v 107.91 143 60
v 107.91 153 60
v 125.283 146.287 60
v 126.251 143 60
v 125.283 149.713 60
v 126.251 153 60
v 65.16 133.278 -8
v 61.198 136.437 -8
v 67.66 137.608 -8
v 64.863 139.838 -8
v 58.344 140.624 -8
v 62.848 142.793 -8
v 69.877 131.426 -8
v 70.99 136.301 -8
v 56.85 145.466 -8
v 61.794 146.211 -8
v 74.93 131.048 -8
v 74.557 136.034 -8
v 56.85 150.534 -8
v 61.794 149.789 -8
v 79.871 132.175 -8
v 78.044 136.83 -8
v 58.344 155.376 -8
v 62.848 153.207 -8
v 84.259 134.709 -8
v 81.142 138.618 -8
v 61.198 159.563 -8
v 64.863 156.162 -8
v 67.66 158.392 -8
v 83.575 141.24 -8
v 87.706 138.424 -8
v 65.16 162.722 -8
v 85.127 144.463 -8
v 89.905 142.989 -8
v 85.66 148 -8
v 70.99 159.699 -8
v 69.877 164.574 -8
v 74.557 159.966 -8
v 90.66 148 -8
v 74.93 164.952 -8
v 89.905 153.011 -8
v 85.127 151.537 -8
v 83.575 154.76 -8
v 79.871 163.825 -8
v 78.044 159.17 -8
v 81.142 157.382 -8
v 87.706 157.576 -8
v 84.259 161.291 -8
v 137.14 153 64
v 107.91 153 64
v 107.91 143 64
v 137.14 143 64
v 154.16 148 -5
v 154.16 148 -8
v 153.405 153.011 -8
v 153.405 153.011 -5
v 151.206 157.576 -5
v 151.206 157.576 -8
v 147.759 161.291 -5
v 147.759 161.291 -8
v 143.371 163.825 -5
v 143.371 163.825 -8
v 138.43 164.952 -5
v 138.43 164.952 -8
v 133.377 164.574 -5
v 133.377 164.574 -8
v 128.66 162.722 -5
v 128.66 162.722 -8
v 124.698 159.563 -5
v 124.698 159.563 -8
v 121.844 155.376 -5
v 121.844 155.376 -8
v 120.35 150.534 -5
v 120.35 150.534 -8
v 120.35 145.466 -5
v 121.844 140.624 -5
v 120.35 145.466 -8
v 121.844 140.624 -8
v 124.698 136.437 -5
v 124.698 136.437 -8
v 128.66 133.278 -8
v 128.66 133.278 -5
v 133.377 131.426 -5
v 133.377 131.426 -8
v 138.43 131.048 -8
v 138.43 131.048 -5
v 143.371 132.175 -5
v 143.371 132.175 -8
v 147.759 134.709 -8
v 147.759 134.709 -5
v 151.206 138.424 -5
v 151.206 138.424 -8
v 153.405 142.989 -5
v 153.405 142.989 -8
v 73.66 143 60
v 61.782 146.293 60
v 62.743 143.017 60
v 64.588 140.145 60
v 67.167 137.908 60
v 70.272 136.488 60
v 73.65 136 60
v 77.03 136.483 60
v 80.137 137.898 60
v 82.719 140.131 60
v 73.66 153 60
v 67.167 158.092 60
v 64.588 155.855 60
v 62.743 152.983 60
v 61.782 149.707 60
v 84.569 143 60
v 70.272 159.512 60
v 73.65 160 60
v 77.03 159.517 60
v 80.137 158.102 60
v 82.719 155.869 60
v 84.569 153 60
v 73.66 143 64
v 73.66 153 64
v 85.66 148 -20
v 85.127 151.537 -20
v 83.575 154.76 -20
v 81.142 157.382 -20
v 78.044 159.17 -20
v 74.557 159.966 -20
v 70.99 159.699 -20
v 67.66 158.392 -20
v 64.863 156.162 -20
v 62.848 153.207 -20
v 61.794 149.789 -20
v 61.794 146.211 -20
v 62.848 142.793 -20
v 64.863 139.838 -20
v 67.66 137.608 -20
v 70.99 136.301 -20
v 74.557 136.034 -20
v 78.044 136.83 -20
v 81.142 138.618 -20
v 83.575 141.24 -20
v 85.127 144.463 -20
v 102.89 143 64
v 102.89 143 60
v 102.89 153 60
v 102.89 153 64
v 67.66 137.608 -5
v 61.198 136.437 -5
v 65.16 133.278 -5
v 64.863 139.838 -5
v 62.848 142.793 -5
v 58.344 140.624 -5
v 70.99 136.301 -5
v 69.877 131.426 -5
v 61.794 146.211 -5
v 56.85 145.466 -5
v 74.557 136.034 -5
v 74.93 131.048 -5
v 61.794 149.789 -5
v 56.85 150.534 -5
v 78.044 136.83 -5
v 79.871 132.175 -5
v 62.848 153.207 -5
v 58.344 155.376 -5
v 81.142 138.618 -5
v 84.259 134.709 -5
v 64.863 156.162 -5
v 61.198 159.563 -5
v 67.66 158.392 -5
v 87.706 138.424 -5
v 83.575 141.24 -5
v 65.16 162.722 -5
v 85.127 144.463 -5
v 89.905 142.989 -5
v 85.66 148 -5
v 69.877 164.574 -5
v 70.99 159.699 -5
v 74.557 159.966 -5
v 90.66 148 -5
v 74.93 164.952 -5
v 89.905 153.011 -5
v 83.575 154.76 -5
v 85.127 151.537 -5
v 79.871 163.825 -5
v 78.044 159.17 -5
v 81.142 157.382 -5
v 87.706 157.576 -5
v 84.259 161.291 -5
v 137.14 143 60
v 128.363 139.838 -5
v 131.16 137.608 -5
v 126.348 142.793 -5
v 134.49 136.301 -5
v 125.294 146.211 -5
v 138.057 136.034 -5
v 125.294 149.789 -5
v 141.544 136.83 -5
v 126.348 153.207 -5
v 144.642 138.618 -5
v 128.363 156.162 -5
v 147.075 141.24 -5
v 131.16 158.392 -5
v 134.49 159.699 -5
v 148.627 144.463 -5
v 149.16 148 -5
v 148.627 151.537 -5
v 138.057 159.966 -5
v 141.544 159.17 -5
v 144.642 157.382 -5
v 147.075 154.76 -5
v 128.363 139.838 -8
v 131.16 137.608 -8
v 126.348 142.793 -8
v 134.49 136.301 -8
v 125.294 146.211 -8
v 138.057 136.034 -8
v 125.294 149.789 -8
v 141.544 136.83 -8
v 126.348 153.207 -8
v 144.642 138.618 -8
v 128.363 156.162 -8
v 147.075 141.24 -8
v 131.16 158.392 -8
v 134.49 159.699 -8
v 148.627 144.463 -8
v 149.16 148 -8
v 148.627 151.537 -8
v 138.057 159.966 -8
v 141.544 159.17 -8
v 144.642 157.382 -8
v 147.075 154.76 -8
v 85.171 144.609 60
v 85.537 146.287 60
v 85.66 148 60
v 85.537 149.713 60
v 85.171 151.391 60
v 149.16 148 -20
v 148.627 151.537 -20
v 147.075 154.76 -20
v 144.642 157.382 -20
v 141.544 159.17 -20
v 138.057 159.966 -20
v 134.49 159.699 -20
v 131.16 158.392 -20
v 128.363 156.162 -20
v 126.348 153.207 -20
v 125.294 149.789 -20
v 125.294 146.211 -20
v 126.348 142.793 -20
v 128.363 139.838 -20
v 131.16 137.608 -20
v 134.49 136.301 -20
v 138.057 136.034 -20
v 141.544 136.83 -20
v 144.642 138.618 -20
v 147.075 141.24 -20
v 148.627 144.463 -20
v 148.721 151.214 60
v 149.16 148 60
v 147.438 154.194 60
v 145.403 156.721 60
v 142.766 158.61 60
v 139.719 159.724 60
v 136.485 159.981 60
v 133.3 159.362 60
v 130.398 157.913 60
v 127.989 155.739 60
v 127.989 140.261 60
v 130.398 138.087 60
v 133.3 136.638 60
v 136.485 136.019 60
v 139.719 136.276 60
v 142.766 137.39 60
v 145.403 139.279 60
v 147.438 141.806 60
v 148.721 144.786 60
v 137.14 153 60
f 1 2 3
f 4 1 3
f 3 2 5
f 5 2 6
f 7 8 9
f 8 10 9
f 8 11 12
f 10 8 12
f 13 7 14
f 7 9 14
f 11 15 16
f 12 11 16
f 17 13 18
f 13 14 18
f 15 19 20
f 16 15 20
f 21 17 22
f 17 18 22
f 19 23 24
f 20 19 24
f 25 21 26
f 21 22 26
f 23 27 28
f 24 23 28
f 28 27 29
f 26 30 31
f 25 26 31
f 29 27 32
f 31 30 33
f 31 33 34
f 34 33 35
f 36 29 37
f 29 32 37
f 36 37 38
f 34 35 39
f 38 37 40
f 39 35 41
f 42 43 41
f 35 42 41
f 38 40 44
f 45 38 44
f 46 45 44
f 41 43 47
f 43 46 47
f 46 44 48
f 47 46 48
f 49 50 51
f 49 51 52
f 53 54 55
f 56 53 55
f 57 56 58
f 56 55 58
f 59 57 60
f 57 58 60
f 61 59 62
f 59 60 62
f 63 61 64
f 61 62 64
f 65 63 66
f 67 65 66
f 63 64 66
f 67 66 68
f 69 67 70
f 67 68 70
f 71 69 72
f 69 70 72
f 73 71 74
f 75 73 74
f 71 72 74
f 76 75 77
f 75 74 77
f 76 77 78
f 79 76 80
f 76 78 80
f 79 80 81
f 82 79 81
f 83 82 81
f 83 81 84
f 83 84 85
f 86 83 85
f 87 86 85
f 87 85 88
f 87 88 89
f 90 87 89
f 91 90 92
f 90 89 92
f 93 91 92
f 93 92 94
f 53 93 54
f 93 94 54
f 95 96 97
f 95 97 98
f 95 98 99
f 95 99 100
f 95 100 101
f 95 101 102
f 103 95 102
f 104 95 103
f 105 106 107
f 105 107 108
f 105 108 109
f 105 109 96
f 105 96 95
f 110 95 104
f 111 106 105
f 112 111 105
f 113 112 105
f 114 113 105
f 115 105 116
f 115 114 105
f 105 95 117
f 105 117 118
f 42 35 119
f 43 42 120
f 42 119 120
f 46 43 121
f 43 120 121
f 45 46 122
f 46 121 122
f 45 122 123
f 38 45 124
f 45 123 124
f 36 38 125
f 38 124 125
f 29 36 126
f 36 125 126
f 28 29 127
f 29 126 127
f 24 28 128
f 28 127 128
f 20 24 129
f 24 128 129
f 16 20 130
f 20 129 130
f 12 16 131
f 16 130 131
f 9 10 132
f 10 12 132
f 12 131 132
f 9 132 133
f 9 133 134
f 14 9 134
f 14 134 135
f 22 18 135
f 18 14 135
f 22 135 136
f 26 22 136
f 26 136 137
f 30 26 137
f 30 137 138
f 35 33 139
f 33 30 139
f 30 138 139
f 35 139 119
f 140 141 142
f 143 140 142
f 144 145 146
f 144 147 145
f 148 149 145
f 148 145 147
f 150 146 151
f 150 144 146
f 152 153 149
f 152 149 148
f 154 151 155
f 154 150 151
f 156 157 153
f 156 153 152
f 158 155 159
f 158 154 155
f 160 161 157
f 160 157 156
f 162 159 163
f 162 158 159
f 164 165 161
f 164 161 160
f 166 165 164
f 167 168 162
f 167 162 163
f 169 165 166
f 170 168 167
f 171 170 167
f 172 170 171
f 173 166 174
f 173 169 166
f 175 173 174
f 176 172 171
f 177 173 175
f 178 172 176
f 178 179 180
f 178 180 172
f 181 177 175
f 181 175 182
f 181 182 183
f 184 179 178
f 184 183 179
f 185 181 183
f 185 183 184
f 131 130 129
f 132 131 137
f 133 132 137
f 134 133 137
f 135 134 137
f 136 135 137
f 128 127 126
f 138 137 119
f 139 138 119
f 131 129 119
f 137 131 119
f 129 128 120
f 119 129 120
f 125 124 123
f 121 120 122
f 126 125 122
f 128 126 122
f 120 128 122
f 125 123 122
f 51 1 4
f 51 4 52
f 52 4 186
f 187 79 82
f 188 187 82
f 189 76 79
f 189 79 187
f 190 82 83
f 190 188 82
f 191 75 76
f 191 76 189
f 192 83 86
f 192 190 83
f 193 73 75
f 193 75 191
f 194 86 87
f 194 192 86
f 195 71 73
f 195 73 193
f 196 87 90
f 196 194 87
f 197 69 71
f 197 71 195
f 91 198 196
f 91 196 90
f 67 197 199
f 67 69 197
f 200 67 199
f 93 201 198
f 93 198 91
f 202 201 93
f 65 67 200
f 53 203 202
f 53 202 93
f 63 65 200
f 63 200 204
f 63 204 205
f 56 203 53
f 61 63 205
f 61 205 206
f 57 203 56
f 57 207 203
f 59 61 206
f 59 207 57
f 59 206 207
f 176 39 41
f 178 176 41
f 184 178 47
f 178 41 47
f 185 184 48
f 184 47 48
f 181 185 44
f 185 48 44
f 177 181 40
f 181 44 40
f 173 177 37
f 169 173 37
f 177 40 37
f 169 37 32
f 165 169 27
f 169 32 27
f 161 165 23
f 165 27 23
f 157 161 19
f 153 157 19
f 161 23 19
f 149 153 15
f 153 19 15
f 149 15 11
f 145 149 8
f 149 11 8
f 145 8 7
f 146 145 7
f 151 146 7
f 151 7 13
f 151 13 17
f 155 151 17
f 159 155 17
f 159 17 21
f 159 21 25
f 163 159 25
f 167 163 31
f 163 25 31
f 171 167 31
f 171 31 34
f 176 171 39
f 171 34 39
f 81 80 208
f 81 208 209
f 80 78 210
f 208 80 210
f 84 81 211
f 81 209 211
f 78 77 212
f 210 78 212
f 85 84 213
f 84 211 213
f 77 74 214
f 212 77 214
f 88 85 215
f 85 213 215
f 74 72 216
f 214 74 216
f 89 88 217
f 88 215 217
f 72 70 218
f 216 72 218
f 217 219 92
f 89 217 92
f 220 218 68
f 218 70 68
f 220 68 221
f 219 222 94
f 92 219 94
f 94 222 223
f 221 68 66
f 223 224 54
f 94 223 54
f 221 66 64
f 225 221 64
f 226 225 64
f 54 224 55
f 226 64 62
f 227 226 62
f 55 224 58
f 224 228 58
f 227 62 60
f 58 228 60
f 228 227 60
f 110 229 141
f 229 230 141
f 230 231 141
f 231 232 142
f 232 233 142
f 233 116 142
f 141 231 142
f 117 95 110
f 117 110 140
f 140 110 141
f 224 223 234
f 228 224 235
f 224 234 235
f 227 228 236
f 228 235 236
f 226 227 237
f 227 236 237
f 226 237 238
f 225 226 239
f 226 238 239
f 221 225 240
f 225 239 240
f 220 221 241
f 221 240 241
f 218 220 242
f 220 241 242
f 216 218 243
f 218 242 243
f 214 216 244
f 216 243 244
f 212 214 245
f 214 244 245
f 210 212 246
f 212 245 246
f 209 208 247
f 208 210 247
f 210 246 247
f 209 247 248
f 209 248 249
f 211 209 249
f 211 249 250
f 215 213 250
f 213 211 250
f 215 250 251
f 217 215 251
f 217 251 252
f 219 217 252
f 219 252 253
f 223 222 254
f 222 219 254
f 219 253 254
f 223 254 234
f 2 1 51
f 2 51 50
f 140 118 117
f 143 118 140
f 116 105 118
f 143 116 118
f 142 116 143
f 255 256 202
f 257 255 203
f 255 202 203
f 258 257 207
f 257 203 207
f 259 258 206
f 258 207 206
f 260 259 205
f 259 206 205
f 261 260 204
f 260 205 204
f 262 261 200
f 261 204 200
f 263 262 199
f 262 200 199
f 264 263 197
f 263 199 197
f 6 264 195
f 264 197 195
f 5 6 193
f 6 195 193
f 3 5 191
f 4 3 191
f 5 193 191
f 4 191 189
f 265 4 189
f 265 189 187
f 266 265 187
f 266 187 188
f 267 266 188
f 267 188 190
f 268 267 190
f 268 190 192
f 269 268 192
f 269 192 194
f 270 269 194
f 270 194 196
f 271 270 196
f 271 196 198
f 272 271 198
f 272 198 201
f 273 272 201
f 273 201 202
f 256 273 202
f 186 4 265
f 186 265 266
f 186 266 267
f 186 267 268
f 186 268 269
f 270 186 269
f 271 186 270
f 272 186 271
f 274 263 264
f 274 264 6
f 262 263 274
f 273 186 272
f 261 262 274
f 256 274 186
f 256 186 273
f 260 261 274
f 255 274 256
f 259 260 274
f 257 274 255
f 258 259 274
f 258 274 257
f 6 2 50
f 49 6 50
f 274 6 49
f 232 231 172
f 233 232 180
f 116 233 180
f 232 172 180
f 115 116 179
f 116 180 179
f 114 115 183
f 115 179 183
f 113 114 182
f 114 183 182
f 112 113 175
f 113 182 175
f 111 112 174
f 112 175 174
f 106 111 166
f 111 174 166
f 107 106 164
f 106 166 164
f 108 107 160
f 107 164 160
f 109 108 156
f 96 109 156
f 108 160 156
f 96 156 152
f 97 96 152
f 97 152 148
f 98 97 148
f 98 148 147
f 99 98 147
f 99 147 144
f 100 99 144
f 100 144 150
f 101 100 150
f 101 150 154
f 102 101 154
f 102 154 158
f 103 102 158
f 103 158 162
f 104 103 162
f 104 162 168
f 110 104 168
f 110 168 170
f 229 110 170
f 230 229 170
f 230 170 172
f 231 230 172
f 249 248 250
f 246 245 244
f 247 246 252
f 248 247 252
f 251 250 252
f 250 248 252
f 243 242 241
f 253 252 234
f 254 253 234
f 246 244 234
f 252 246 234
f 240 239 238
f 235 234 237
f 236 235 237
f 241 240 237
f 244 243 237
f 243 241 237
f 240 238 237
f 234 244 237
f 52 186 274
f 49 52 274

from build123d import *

# Parameters (mm, degrees)
CYLINDER100_R     = 17
CYLINDER100_DEPTH = 3
CYLINDER095_R     = 12
CYLINDER095_DEPTH = 80
CYLINDER132_R     = 17
CYLINDER132_DEPTH = 3
CYLINDER131_R     = 12
CYLINDER131_DEPTH = 80
BOX029_W          = 29.23
BOX029_H          = 10
BOX029_DEPTH      = 4
BOX020_W          = 29.23
BOX020_H          = 10
BOX020_DEPTH      = 4


with BuildPart() as ft1flange:
    # Cylinder100 → Cylinder100 (new body)
    with BuildSketch(Plane(origin=(73.66, 148, -8), x_dir=(1, 0, 0), z_dir=(0, 0, 1))):
        Circle(CYLINDER100_R)
    extrude(amount=CYLINDER100_DEPTH)


with BuildPart() as ft1:
    # Cylinder095 → Cylinder095 (new body)
    with BuildSketch(Plane(origin=(73.66, 148, -20), x_dir=(1, 0, 0), z_dir=(0, 0, 1))):
        Circle(CYLINDER095_R)
    extrude(amount=CYLINDER095_DEPTH)

    # Fusion043: union FT1flange
    add(ft1flange.part)


with BuildPart() as ft1flange001:
    # Cylinder132 → Cylinder132 (new body)
    with BuildSketch(Plane(origin=(73.66, 148, -8), x_dir=(1, 0, 0), z_dir=(0, 0, 1))):
        Circle(CYLINDER132_R)
    extrude(amount=CYLINDER132_DEPTH)


with BuildPart() as ft002:
    # Cylinder131 → Cylinder131 (new body)
    with BuildSketch(Plane(origin=(73.66, 148, -20), x_dir=(1, 0, 0), z_dir=(0, 0, 1))):
        Circle(CYLINDER131_R)
    extrude(amount=CYLINDER131_DEPTH)

    # Fusion052: union FT1flange001
    add(ft1flange001.part)


with BuildPart() as ft002_1:
    # Fusion052 placement: moved
    add(ft002.part.moved(Location((63.5, 0, 0))))


with BuildPart() as bowtiebar002:
    # Box029 → Box029 (new body)
    with BuildSketch(Plane(origin=(107.91, 143, 60), x_dir=(1, 0, 0), z_dir=(0, 0, 1))):
        with Locations((14.615, 5)):
            Rectangle(BOX029_W, BOX029_H)
    extrude(amount=BOX029_DEPTH)


with BuildPart() as fusion057:
    # Box020 → Box020 (new body)
    with BuildSketch(Plane(origin=(73.66, 143, 60), x_dir=(1, 0, 0), z_dir=(0, 0, 1))):
        with Locations((14.615, 5)):
            Rectangle(BOX020_W, BOX020_H)
    extrude(amount=BOX020_DEPTH)

    # Fusion057: union FT1, FT002, BowTieBar002
    add(ft1.part)
    add(ft002_1.part)
    add(bowtiebar002.part)


solid = fusion057.part
